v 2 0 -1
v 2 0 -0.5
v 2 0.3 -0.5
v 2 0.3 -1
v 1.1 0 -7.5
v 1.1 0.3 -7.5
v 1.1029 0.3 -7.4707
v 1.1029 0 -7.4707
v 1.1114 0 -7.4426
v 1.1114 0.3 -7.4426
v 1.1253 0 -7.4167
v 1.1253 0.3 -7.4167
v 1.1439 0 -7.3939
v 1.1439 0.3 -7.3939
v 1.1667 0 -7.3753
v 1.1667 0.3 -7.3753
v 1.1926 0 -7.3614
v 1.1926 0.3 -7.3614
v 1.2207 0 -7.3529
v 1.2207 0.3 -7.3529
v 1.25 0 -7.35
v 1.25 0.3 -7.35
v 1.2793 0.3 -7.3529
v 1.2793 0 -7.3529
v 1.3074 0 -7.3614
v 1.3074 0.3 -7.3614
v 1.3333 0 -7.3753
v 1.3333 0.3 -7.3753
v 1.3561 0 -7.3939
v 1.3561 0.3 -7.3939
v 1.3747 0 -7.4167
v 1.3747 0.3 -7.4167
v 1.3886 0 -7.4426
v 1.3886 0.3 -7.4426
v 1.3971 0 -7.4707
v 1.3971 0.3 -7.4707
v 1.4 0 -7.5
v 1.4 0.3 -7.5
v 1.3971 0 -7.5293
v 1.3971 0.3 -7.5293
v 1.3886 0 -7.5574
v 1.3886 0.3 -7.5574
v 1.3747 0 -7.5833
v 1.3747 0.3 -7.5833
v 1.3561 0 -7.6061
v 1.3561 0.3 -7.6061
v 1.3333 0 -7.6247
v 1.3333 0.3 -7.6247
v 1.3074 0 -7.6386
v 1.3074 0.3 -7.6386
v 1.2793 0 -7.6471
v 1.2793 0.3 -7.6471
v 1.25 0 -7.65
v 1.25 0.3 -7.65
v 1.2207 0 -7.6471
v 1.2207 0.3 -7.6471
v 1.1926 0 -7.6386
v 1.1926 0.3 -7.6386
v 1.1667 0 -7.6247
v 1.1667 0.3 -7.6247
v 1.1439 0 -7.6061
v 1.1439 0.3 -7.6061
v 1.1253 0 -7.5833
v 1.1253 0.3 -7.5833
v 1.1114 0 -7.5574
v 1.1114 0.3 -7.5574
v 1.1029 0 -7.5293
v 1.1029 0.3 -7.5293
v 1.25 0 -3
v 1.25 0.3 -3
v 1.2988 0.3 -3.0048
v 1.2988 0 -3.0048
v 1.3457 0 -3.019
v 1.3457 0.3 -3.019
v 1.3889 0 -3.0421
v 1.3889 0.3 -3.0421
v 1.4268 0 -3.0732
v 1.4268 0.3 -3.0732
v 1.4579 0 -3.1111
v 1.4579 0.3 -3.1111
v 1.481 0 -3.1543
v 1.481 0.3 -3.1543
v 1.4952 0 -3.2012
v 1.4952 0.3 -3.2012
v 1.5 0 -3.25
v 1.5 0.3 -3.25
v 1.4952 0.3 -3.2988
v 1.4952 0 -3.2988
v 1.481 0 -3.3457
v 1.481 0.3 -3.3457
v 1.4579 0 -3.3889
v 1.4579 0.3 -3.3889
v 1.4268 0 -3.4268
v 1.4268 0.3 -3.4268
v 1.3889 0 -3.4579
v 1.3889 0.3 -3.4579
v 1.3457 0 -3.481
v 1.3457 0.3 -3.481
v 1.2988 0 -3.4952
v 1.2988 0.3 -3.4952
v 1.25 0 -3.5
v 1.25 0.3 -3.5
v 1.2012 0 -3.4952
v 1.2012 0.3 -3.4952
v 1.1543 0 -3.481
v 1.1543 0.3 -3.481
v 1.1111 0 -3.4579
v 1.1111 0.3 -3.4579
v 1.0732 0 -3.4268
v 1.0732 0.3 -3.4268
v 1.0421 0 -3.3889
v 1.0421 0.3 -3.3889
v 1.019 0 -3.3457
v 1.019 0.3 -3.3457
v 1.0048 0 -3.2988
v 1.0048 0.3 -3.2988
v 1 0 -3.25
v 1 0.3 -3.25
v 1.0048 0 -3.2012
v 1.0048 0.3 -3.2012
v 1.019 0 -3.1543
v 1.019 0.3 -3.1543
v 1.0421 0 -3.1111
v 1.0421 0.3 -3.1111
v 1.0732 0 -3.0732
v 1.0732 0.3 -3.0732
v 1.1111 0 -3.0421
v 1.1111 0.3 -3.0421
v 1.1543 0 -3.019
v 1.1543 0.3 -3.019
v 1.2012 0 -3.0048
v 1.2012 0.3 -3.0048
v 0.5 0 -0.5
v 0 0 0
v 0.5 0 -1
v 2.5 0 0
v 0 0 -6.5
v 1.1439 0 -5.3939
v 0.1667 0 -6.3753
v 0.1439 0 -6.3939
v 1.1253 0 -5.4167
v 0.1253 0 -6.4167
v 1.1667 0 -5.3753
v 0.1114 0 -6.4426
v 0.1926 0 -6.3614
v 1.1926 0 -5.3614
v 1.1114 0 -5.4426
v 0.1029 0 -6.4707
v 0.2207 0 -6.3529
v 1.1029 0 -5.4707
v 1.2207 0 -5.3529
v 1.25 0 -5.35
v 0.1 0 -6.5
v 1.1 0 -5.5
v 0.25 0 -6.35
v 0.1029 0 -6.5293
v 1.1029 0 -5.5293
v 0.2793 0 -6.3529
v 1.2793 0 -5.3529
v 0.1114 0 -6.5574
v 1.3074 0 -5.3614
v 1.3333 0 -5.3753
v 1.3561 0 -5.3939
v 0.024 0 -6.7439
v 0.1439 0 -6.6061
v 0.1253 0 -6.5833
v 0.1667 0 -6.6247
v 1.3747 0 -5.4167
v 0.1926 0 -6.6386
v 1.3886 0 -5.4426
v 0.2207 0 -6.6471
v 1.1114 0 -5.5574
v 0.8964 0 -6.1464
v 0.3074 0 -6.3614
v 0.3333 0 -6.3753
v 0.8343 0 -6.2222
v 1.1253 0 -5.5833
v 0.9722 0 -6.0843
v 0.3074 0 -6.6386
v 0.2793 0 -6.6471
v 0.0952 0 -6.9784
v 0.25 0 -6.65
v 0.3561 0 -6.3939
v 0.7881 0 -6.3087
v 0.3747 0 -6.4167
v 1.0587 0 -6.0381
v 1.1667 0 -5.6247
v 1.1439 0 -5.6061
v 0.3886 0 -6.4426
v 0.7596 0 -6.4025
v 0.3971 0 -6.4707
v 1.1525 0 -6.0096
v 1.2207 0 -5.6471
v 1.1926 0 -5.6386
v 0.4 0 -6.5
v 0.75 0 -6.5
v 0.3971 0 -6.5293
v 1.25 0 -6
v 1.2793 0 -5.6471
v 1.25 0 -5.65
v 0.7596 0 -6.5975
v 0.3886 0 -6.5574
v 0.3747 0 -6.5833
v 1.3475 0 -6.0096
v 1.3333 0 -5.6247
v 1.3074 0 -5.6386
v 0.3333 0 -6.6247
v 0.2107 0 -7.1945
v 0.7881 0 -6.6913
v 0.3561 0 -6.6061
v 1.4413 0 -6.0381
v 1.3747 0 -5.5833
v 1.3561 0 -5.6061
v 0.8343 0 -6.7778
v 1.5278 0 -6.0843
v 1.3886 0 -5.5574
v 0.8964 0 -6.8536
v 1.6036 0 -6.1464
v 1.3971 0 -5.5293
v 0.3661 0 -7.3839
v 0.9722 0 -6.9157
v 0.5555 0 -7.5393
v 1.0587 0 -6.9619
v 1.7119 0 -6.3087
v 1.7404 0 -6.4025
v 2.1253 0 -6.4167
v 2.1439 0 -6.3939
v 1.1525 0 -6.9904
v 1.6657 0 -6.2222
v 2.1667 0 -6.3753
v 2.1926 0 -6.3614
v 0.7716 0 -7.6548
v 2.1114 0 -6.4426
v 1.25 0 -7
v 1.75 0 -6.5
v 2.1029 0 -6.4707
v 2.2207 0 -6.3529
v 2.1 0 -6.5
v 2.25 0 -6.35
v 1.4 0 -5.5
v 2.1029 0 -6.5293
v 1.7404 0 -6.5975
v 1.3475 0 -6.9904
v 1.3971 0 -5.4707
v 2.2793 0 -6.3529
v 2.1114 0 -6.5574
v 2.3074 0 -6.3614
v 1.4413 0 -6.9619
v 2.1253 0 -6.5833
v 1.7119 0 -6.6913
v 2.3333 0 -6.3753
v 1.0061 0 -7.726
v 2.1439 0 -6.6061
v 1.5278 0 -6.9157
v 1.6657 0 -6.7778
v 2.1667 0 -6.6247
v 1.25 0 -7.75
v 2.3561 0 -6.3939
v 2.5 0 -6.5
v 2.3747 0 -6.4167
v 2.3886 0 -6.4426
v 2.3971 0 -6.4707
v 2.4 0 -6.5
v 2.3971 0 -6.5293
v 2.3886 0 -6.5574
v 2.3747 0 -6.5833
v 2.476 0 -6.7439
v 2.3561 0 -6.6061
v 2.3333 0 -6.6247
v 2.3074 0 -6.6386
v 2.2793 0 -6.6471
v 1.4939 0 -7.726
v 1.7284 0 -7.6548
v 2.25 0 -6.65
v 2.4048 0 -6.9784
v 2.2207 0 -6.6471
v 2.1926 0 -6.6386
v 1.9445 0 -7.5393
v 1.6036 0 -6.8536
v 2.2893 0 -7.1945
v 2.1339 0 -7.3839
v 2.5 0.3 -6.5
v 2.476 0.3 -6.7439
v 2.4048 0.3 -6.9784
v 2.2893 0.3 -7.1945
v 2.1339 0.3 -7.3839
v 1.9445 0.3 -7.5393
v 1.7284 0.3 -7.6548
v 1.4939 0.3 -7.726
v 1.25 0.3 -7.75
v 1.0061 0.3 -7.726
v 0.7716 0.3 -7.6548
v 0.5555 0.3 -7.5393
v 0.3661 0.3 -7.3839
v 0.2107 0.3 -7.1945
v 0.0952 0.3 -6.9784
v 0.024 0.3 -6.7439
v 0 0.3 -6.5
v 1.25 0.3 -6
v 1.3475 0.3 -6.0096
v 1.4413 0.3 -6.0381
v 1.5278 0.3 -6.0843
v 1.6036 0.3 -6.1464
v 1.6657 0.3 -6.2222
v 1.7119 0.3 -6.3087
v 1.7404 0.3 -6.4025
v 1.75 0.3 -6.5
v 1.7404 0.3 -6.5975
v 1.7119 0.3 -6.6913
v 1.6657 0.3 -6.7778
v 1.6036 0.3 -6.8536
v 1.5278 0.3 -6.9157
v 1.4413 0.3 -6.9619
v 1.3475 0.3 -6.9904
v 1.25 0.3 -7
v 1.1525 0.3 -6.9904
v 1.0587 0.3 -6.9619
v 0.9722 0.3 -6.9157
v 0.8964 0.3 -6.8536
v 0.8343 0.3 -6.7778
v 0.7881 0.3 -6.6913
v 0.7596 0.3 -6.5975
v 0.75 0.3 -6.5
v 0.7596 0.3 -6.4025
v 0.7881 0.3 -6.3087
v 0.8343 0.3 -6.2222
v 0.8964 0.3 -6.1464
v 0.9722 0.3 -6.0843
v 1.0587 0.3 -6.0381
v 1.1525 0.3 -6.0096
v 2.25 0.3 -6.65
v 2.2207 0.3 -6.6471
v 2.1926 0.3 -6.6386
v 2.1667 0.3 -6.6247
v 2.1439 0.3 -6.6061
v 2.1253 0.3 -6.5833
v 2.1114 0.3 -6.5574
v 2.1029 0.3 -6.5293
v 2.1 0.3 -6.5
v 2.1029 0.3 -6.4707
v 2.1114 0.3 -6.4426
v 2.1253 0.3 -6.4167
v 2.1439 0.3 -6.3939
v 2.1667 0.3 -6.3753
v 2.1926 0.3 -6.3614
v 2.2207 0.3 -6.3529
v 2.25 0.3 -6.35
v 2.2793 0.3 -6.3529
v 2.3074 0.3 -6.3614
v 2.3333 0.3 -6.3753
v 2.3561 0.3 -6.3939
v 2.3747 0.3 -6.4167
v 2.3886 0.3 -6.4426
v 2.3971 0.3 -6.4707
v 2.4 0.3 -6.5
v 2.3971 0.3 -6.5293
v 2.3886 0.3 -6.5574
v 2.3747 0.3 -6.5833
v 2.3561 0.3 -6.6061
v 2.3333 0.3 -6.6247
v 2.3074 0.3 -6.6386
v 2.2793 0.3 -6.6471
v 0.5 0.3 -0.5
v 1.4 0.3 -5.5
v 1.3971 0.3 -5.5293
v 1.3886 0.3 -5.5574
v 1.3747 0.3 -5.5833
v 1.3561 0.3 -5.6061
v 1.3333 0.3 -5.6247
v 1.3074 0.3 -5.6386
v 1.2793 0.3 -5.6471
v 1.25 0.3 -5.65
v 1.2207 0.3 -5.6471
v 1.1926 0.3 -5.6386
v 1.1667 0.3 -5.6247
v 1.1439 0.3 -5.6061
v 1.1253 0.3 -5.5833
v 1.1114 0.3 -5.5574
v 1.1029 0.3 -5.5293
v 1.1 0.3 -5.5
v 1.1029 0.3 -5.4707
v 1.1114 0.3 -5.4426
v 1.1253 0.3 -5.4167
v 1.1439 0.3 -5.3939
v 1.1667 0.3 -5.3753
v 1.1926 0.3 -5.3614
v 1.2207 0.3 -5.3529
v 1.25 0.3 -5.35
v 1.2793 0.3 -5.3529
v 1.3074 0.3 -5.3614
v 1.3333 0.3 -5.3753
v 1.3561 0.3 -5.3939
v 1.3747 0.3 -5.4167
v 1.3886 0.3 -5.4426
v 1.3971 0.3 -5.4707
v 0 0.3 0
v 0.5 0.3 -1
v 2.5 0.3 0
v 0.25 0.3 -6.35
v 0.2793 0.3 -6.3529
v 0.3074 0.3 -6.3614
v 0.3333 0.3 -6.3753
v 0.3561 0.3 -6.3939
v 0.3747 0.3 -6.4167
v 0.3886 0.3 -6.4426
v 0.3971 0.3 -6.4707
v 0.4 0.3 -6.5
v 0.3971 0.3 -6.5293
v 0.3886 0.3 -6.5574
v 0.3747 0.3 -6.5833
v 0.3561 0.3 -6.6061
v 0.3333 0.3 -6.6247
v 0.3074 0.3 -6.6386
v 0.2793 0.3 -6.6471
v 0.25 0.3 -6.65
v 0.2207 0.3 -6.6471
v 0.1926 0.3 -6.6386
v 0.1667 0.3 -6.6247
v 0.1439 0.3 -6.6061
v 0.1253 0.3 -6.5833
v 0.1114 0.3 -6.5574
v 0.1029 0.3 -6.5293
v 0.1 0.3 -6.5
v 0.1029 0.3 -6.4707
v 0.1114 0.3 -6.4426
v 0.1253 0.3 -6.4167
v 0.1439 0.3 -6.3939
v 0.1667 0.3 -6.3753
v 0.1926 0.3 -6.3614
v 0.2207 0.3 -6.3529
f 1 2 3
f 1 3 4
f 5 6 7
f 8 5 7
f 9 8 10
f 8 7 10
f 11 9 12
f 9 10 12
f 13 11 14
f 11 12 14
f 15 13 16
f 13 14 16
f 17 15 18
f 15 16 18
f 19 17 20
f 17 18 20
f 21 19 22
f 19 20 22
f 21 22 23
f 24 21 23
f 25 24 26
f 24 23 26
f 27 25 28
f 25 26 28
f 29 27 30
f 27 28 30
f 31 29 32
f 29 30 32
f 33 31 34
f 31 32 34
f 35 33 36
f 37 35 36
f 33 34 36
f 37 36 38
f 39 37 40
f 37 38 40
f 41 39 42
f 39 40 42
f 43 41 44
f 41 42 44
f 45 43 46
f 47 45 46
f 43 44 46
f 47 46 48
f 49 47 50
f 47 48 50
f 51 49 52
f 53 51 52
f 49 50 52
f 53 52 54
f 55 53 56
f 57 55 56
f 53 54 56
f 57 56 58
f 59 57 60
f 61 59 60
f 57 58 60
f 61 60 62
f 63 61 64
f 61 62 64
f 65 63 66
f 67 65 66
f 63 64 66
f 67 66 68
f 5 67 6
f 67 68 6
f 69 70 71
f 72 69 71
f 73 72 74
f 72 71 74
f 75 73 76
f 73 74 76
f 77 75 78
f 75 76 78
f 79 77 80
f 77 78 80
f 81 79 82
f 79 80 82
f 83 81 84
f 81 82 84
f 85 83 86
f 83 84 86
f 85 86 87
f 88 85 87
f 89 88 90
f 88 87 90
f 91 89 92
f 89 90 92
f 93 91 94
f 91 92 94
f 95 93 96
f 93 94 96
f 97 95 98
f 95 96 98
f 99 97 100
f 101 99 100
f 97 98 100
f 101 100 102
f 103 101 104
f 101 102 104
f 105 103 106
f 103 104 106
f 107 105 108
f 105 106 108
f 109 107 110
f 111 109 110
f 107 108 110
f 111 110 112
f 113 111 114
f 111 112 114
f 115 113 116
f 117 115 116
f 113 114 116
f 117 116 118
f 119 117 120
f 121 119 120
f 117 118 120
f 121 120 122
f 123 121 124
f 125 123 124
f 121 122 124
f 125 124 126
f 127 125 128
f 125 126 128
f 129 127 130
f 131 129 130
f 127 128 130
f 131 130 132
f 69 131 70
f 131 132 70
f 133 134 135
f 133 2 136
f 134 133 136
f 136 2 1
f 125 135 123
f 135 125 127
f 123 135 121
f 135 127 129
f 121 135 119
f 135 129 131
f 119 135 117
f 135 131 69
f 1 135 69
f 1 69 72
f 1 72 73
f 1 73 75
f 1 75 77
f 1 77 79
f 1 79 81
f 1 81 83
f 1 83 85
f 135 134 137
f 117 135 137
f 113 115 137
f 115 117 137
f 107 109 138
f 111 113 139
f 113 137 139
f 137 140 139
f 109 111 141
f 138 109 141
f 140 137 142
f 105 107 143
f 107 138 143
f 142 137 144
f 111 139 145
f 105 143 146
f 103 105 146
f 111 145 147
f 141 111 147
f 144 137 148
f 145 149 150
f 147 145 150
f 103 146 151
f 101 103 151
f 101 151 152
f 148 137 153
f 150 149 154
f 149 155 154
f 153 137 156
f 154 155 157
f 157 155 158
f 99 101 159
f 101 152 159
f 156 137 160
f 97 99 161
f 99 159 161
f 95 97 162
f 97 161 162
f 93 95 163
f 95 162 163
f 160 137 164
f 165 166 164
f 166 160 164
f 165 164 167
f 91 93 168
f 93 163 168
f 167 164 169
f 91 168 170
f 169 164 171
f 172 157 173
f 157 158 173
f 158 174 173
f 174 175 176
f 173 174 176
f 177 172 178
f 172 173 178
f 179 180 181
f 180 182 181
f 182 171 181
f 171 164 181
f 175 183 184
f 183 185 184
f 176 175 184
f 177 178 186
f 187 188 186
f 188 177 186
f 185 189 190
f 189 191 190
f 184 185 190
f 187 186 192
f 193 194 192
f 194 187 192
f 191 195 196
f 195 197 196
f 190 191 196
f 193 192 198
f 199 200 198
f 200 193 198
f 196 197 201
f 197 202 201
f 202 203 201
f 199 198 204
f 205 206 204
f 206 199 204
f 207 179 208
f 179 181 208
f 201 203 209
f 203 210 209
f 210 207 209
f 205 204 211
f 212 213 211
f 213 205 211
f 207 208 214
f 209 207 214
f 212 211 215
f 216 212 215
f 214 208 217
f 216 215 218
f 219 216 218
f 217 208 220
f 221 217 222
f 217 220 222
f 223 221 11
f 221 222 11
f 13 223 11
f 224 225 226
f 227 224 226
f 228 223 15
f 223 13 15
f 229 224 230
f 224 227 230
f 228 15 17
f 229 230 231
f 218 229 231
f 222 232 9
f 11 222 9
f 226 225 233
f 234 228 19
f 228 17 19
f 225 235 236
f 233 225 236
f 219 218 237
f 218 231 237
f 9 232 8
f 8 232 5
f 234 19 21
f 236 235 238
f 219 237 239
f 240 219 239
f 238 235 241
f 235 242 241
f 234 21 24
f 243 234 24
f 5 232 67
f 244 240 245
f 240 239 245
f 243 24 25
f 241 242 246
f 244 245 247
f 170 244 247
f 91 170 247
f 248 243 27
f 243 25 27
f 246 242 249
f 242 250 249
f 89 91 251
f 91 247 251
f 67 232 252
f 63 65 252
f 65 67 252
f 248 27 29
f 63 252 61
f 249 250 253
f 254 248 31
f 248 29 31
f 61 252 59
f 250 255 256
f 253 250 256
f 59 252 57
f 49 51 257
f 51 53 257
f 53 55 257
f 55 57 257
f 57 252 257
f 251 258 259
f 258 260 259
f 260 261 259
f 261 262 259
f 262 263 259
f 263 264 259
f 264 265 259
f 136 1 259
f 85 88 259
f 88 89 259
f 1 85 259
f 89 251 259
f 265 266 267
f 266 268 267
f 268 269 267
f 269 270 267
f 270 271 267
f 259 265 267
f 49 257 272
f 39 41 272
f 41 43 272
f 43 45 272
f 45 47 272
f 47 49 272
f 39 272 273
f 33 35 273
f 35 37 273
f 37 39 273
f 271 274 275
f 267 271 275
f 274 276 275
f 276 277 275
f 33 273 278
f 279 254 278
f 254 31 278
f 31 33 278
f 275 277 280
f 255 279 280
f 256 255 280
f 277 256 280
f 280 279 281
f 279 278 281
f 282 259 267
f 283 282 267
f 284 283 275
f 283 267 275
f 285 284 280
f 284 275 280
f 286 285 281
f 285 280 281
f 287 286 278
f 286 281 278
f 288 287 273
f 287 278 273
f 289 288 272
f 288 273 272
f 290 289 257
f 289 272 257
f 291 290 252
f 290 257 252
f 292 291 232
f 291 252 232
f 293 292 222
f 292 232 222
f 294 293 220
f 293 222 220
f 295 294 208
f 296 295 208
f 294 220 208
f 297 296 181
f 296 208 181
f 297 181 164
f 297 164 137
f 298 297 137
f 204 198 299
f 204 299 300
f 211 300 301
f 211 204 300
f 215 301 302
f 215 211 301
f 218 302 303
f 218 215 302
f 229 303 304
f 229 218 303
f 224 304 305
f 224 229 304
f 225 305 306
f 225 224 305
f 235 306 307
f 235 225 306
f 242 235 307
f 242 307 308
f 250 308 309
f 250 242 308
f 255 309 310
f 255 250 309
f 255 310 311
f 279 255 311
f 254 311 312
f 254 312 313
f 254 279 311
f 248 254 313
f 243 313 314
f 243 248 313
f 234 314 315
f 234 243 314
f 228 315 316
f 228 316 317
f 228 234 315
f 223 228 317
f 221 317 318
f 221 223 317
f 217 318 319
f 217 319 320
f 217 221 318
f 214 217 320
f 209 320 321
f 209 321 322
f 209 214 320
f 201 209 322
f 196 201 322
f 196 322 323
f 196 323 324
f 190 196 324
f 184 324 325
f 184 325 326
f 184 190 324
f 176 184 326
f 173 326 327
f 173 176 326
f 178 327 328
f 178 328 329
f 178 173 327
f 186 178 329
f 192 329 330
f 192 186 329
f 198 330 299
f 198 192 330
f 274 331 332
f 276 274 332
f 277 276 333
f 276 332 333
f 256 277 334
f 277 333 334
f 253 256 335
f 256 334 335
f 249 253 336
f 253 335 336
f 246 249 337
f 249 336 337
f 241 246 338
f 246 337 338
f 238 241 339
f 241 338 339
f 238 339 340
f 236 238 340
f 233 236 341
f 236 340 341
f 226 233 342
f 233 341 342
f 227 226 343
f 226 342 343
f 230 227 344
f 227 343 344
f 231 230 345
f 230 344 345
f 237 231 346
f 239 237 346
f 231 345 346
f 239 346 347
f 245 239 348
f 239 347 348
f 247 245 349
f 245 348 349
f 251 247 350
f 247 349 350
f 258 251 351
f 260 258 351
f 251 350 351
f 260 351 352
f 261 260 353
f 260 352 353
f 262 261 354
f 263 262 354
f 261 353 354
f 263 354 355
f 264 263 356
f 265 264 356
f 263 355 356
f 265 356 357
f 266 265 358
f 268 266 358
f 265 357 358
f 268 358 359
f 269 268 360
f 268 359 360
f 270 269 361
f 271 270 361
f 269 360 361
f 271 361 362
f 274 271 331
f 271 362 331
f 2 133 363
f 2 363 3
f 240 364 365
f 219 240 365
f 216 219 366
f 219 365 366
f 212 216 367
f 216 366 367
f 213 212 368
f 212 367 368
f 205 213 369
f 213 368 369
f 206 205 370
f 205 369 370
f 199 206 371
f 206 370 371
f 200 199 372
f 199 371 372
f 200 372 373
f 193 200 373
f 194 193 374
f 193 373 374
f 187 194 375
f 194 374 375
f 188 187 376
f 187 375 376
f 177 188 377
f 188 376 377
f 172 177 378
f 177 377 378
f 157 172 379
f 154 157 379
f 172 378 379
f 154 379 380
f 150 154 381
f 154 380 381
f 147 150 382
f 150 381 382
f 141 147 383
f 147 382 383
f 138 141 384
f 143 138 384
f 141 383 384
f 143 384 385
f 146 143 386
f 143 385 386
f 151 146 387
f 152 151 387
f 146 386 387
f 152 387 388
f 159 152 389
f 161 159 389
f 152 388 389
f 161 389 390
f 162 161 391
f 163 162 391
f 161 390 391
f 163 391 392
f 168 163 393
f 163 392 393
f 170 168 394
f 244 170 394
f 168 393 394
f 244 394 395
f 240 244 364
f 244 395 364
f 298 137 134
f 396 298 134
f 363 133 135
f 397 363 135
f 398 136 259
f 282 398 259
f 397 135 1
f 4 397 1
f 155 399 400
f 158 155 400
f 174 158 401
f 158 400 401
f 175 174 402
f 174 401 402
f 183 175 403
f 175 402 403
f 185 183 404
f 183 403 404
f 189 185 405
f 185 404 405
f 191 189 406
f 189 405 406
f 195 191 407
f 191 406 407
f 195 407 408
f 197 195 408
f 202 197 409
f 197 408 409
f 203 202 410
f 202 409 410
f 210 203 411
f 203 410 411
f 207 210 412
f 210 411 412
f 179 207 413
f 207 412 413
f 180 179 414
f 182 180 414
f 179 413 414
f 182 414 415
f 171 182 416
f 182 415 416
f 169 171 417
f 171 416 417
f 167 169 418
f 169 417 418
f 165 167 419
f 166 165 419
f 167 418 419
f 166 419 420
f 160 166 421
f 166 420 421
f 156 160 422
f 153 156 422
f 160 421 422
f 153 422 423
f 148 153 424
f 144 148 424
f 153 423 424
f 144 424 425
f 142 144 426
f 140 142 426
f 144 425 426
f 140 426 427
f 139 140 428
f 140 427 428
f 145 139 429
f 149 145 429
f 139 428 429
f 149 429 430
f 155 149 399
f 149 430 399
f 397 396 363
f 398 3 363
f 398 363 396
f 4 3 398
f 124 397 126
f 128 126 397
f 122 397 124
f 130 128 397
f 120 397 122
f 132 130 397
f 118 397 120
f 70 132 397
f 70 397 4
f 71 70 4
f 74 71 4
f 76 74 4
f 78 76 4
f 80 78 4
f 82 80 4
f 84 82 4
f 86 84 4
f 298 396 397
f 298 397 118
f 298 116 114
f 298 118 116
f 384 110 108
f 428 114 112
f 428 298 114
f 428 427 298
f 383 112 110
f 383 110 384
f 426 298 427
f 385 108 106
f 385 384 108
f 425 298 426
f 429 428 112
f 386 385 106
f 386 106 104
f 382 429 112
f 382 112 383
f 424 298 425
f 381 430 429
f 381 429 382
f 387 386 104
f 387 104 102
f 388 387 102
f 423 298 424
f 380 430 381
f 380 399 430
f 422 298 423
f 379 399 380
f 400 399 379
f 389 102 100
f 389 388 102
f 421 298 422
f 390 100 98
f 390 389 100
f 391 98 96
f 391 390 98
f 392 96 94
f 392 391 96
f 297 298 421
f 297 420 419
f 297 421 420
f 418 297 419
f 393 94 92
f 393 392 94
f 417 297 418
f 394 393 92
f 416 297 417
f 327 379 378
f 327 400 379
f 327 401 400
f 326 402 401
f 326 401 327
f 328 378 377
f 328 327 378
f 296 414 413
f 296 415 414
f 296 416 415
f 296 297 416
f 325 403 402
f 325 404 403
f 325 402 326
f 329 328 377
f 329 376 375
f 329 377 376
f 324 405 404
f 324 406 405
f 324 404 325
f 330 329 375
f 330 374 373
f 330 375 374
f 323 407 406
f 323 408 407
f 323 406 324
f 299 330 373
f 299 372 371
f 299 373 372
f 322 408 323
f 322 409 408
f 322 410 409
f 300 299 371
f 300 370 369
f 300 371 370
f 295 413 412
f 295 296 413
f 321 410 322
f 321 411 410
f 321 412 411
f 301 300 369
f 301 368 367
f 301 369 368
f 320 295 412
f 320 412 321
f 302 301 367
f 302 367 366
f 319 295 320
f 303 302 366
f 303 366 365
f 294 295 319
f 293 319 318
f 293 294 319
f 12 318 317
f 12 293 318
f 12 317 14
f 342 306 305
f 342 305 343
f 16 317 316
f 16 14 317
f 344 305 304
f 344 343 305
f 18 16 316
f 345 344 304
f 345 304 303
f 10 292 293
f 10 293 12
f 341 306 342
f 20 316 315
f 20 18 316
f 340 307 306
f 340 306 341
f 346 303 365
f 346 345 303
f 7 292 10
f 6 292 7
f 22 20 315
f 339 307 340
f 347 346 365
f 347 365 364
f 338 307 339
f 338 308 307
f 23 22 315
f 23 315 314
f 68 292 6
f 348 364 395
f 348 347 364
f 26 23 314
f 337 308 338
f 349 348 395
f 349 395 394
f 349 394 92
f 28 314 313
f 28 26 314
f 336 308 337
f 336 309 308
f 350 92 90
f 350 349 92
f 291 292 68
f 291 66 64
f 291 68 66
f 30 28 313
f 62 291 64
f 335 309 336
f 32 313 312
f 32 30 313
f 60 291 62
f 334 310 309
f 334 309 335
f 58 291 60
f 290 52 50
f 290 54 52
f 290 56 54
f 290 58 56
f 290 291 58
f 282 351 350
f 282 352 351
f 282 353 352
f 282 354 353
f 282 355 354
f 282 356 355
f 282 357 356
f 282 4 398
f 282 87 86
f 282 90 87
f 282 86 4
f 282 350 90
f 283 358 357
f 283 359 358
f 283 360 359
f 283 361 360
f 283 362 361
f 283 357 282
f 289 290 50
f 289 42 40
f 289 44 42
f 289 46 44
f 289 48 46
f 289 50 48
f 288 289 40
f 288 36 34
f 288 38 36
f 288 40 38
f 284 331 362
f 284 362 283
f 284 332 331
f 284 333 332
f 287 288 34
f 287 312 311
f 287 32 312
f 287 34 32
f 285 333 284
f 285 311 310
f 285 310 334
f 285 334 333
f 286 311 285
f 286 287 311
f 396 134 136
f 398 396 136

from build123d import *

# Parameters (mm, degrees)
SKETCH1_R           = 0.5
SKETCH1_W           = 1.5
SKETCH1_H           = 0.5
BOSS_EXTRUDE1_DEPTH = 0.3
SKETCH2_R           = 0.15
CUT_EXTRUDE1_DEPTH  = 0.3
CIRPATTERN1_COUNT   = 4
SKETCH5_R           = 0.25
CUT_EXTRUDE3_DEPTH  = 0.3


with BuildPart() as part:
    # Sketch1 → Boss-Extrude1 (new body)
    with BuildSketch(Plane(origin=(0, 0, 0), x_dir=(1, 0, 0), z_dir=(0, 1, 0))):
        with BuildLine():
            Line((0, 0), (2.5, 0))
            Line((2.5, 0), (2.5, 6.5))
            ThreePointArc((2.5, 6.5), (1.25, 7.75), (0, 6.5))
            Line((0, 6.5), (0, 0))
        make_face()
        with Locations(Location((1.25, 6.5, 0), (0, 0, 270))):
            Circle(SKETCH1_R, mode=Mode.SUBTRACT)
        with Locations((1.25, 0.75)):
            Rectangle(SKETCH1_W, SKETCH1_H, mode=Mode.SUBTRACT)
    extrude(amount=BOSS_EXTRUDE1_DEPTH)

    # Sketch2 → Cut-Extrude1 (cut)
    with BuildSketch(Plane(origin=(0, 0.3, 0), x_dir=(1, 0, 0), z_dir=(0, 1, 0))):
        with Locations(Location((0.25, 6.5, 0), (0, 0, 270))):
            Circle(SKETCH2_R)
    cut_extrude1 = extrude(amount=-CUT_EXTRUDE1_DEPTH, mode=Mode.SUBTRACT)

    # CirPattern1: Cut-Extrude1 ×4 about axis
    cirpattern1_axis = Axis((1.25, 0, -6.5), (0, 1, 0))
    for i in range(1, CIRPATTERN1_COUNT):
        add(cut_extrude1.rotate(cirpattern1_axis, i * 360 / CIRPATTERN1_COUNT), mode=Mode.SUBTRACT)

    # Sketch5 → Cut-Extrude3 (cut)
    with BuildSketch(Plane(origin=(0, 0.3, 0), x_dir=(1, 0, 0), z_dir=(0, 1, 0))):
        with Locations(Location((1.25, 3.25, 0), (0, 0, 270))):
            Circle(SKETCH5_R)
    extrude(amount=-CUT_EXTRUDE3_DEPTH, mode=Mode.SUBTRACT)


solid = part.part
